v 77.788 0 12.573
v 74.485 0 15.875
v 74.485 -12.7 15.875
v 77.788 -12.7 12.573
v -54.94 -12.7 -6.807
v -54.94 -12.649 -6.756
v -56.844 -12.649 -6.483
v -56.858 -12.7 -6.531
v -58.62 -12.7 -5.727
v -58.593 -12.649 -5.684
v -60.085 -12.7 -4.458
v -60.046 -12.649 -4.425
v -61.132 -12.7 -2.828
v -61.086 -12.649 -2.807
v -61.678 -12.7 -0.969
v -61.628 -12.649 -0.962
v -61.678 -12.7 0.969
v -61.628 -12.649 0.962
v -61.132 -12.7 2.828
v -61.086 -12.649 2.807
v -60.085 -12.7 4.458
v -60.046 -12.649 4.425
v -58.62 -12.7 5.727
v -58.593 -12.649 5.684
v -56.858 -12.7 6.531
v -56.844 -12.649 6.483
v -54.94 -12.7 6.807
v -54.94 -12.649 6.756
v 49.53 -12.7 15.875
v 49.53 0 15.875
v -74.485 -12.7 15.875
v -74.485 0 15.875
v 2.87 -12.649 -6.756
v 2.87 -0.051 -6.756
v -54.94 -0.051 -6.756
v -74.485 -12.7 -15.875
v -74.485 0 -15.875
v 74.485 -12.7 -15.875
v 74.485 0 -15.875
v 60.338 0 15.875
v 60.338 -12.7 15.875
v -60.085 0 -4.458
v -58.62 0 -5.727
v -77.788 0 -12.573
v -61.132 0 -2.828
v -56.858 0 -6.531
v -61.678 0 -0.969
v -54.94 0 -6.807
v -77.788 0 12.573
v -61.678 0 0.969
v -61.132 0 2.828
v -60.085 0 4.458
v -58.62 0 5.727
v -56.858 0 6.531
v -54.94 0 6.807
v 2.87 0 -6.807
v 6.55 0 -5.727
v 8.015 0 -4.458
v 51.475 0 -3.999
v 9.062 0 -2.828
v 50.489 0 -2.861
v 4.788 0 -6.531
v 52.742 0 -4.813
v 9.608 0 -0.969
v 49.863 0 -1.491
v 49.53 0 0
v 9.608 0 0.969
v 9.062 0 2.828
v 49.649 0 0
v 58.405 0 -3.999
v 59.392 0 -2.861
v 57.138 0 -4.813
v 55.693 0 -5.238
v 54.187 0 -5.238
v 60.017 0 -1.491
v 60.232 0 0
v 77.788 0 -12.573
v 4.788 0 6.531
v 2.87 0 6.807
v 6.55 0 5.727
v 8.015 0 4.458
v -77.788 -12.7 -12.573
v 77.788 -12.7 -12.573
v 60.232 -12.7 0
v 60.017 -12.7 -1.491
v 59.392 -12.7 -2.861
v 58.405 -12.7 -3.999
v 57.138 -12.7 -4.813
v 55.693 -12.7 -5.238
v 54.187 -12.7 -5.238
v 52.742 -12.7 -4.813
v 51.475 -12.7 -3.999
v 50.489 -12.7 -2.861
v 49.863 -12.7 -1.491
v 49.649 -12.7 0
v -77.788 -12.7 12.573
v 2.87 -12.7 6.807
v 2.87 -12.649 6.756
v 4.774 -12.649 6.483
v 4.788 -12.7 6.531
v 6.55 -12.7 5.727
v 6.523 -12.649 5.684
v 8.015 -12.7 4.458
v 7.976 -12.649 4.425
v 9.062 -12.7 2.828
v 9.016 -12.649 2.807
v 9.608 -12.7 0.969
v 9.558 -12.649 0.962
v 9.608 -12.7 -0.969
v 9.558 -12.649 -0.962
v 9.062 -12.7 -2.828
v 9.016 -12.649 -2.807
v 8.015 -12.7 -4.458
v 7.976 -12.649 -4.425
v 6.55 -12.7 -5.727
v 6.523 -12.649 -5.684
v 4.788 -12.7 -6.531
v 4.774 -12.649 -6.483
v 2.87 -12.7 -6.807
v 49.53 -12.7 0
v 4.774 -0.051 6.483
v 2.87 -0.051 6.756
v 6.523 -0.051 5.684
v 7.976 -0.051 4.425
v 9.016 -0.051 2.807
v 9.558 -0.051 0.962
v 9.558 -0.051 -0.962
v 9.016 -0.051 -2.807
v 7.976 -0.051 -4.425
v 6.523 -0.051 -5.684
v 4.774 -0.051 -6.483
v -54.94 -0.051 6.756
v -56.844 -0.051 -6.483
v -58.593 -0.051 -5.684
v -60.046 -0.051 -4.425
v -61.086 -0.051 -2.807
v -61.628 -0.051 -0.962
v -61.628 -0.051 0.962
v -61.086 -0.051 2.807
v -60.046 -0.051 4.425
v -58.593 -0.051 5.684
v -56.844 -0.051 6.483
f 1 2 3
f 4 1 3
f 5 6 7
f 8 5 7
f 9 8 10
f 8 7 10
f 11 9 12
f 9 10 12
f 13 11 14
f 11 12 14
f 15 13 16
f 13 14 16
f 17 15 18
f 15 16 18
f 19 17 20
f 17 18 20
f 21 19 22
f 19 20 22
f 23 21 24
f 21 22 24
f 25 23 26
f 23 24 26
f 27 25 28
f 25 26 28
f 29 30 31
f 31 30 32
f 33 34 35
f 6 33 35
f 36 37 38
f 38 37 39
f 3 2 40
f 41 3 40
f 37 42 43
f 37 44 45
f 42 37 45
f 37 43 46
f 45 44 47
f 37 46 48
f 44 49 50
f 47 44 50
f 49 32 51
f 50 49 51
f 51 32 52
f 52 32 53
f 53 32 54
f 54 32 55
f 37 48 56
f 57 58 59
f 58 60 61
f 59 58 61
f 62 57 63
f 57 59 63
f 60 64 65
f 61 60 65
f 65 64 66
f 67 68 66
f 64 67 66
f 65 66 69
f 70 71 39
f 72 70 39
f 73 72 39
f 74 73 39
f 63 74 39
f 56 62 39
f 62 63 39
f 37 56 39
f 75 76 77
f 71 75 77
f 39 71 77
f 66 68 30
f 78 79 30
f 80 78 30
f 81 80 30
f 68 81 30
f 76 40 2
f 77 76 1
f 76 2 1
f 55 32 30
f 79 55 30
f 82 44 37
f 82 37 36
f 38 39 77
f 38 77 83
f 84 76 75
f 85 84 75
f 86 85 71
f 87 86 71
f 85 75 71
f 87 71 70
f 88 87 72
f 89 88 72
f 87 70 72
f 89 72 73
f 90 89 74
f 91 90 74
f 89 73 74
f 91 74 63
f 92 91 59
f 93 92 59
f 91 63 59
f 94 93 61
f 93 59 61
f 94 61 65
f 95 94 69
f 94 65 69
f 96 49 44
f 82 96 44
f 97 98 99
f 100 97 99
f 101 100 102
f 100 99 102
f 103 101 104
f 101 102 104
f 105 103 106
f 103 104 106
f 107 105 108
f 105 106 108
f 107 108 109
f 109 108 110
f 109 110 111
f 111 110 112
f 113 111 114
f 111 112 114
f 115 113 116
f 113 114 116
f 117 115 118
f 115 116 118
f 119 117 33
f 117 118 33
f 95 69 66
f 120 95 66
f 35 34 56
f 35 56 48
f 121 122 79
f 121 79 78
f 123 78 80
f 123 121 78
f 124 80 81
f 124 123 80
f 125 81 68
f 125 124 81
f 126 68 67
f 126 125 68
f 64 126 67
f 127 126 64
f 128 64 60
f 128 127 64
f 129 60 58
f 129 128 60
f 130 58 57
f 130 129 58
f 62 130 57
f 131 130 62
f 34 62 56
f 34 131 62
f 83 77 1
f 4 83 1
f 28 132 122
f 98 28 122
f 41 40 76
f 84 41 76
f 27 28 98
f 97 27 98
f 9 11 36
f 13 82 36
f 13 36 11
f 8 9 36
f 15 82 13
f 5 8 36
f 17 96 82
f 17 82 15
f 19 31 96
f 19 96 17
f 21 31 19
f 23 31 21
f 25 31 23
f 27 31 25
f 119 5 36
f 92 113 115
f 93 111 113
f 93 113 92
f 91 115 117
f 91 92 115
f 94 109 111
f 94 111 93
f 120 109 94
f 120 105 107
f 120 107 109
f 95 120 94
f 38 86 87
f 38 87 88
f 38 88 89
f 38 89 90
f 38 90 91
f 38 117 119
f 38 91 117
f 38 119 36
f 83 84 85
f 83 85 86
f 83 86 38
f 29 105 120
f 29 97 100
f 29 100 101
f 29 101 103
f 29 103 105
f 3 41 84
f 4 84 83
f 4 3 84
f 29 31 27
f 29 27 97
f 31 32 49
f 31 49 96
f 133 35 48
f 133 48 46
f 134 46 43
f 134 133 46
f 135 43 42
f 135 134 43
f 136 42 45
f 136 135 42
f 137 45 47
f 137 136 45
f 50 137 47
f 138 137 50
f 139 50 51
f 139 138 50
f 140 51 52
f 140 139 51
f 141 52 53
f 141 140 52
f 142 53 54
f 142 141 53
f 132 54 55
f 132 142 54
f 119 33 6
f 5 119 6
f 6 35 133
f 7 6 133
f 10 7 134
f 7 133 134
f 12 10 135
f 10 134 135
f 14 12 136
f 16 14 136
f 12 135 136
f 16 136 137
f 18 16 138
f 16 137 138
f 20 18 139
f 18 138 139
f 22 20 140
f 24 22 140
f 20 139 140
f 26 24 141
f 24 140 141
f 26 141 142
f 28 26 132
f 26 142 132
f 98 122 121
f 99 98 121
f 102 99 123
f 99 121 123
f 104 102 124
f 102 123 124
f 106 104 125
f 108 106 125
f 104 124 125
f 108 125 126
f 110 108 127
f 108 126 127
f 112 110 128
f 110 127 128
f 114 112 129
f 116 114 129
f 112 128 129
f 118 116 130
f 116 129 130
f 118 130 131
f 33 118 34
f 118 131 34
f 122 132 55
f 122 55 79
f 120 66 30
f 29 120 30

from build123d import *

# Parameters (mm, degrees)
F1_DEPTH = 12.7
F2_SIZE  = 3.302
F3_SIZE  = 0.0508


with BuildPart() as f1:
    # F0 (on Front) → F1 (new body)
    with BuildSketch(Plane.XZ):
        with BuildLine():
            Line((77.7875, -15.875), (77.7875, 15.875))
            Line((77.7875, 15.875), (60.3377, 15.875))
            Line((60.3377, 15.875), (60.231681, 0))
            ThreePointArc((60.231681, 0), (54.9402, -5.291481), (49.648719, 0))
            Line((49.648719, 0), (49.53, 0))
            Line((49.53, 0), (49.53, 15.875))
            Line((49.53, 15.875), (-77.7875, 15.875))
            Line((-77.7875, 15.875), (-77.7875, -15.875))
            Line((-77.7875, -15.875), (77.7875, -15.875))
        make_face()
        with BuildLine():
            Line((2.8702, -6.7564), (-54.9402, -6.7564))
            ThreePointArc((-54.9402, -6.7564), (-61.6966, 0), (-54.9402, 6.7564))
            Line((-54.9402, 6.7564), (2.8702, 6.7564))
            ThreePointArc((2.8702, 6.7564), (9.6266, 0), (2.8702, -6.7564))
        make_face(mode=Mode.SUBTRACT)
    extrude(amount=F1_DEPTH)

    # F2
    f2_edges = [f1.edges().sort_by_distance(p)[0] for p in [
        (-77.7875, -6.35, 15.875),
        (-77.7875, -6.35, -15.875),
        (77.7875, -6.35, -15.875),
        (77.7875, -6.35, 15.875),
    ]]
    chamfer(f2_edges, length=F2_SIZE)

    # F3
    f3_edges = [f1.edges().sort_by_distance(p)[0] for p in [
        (-26.035, -12.7, 6.7564),
        (-61.6966, -12.7, 0),
        (-26.035, -12.7, -6.7564),
        (9.6266, -12.7, 0),
        (-61.6966, 0, 0),
        (-26.035, 0, -6.7564),
        (-26.035, 0, 6.7564),
        (9.6266, 0, 0),
    ]]
    chamfer(f3_edges, length=F3_SIZE)


solid = f1.part
